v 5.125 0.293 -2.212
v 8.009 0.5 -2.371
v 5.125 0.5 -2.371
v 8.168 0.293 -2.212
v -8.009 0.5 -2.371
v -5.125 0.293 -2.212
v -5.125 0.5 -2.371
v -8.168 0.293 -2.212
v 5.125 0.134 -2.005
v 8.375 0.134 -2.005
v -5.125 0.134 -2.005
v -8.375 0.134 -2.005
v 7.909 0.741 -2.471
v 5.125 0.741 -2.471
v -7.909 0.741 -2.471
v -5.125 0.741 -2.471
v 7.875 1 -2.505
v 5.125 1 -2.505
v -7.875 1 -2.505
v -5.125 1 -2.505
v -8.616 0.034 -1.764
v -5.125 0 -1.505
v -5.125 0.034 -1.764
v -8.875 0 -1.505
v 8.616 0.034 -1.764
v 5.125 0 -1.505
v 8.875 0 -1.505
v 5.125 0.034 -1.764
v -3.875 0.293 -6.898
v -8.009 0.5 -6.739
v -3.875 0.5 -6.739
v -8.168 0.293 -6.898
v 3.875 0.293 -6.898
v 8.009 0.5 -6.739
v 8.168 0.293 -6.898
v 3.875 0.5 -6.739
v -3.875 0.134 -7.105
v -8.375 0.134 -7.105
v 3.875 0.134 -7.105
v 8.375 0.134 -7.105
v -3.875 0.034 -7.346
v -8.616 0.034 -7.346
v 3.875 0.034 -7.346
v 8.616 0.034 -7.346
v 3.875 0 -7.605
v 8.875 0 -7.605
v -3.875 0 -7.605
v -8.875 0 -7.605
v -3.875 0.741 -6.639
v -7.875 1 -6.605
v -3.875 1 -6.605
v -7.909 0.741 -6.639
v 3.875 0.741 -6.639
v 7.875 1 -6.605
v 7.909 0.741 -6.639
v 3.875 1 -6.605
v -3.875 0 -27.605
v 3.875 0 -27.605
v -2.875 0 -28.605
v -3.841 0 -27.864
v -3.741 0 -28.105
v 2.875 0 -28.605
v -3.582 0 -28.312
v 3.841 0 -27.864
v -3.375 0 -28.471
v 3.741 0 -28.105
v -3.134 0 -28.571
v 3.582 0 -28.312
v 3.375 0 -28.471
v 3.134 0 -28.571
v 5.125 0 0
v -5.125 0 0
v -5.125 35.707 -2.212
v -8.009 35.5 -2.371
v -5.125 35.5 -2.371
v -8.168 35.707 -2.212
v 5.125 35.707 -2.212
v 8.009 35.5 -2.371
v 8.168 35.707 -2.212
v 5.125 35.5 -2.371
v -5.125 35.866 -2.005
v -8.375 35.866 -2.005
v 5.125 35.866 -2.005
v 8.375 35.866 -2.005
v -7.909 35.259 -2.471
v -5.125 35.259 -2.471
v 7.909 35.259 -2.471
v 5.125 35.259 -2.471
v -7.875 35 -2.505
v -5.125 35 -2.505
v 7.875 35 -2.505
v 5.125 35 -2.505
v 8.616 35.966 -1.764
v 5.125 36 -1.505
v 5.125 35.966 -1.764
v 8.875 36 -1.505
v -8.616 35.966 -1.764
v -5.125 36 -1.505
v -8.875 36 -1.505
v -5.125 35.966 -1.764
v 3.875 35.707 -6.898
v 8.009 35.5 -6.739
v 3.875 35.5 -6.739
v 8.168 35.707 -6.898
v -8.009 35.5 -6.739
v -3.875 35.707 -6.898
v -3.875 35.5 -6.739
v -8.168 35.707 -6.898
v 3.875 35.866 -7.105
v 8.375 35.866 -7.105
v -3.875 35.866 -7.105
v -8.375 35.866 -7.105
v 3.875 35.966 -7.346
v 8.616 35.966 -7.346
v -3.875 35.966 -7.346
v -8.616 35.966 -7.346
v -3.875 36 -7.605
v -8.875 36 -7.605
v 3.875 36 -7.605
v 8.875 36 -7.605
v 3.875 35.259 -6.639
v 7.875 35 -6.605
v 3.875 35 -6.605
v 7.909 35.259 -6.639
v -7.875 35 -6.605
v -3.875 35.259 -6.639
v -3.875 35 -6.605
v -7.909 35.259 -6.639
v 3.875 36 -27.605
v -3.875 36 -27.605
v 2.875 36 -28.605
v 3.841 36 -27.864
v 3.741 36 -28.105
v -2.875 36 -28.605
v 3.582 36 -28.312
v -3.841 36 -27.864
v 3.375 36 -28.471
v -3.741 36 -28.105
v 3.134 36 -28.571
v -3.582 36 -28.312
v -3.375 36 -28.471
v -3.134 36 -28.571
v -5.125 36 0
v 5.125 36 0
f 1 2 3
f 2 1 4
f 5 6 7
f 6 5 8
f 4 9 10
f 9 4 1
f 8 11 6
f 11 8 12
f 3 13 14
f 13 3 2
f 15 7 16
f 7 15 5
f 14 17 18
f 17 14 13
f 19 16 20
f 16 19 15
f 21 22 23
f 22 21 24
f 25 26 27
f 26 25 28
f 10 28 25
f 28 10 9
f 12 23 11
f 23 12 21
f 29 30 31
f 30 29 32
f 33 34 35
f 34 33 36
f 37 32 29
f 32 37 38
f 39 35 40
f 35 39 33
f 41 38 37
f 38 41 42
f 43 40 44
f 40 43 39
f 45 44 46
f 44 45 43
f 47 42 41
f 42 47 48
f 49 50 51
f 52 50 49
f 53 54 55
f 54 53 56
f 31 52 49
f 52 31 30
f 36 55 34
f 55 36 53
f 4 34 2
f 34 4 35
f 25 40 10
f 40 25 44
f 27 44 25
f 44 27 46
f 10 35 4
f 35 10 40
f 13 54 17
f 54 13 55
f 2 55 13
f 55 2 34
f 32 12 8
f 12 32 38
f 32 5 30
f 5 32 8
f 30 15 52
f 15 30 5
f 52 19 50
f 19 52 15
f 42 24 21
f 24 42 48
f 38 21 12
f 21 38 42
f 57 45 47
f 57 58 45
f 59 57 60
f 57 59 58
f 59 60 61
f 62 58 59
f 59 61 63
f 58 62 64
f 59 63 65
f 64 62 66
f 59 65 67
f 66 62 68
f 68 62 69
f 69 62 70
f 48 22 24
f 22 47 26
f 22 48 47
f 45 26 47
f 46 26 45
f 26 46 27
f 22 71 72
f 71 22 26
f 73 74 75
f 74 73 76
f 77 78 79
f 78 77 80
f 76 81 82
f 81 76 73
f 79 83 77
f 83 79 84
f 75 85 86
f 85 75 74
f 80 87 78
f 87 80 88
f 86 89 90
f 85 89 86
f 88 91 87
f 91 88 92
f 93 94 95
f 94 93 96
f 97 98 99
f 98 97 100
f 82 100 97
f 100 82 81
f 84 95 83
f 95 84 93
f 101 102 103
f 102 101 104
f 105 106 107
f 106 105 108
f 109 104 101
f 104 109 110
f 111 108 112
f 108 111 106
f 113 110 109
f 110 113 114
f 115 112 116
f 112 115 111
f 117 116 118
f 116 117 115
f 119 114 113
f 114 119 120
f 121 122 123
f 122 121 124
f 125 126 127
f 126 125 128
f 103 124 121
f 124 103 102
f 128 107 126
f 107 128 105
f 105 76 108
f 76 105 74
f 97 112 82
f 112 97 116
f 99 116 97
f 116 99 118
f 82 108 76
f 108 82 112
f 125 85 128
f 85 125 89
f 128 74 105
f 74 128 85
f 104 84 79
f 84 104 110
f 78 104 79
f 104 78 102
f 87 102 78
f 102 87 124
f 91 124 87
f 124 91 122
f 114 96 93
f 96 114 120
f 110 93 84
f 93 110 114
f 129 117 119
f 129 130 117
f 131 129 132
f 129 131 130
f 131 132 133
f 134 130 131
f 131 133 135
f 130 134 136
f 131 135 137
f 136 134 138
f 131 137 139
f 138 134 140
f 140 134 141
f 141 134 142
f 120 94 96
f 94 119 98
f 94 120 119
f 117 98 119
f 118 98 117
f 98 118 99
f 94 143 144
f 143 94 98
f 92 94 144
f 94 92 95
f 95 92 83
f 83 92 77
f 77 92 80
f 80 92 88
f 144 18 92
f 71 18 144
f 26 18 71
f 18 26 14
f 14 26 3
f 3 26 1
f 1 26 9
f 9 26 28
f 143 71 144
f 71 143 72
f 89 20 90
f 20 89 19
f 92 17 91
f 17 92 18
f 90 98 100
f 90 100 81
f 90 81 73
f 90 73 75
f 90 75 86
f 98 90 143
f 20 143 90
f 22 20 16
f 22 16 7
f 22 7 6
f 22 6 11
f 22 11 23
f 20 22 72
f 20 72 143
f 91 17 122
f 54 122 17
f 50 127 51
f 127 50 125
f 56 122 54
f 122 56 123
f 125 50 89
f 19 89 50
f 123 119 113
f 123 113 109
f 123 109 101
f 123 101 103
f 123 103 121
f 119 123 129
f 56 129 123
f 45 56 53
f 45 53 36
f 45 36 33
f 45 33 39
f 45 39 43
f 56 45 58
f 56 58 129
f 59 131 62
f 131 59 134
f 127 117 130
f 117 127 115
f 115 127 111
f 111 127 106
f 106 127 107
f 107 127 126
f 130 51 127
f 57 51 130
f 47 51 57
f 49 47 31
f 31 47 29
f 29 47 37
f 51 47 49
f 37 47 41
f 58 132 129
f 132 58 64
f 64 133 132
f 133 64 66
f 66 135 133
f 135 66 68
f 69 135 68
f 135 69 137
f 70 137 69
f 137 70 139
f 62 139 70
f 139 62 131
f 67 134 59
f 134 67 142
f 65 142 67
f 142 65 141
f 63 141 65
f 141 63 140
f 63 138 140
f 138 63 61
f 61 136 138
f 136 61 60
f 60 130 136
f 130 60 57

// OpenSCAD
// This negative space can be combined with a Black+Decker to Ryobi adapter

internal_notch_offset = [0, 0, 0];
internal_notch_width = 10.25;
internal_notch_height = 2.505;
internal_notch_depth = 36; //34 after lower chamfer
internal_notch_translate = internal_notch_offset + [ -internal_notch_width/2, 0, -internal_notch_height];
internal_notch_chamfer = 1.000; //6 segments

slot_offset = [0, 0, -internal_notch_height];
slot_width = 15.75; //width before adding chamfer space
slot_height = 4.10;
slot_depth = 36;
slot_translate = slot_offset + [ -slot_width/2, 0, -slot_height];
//slot_width=17.875; //width at its widest point of the chamfer

external_notch_offset = slot_offset + [0, 0, -slot_height];
external_notch_width = 7.75;
external_notch_height = 22; //measured from bottom of slot
external_notch_depth = 36;
external_notch_translate = external_notch_offset + [ - external_notch_width/2, 0, -external_notch_height];

//90 degree chamfer arc of six segments
module arc() {
  intersection() {
    square();
    circle(r = 1, $fn=6*4);
  }
}

//negative chamfer arc
module narc() {
  difference() {
    square();
    circle(r = 1, $fn=6*4);
  }
}

//quarter_round module
module qr(d) {
  linear_extrude(d) arc();
}

//negative quarter round module
module nqr(d) {
  linear_extrude(d) narc();
}
module frame(width,height) {
  translate([width/2,0,height/2])rotate([0,90,180])qr(width);
  translate([-width/2,0,-height/2])rotate([0,-90,180])qr(width);
  translate([width/2,0,-height/2])rotate([0,0,180])qr(height);
  translate([-width/2,0,-height/2])rotate([0,0,-90])qr(height);
}
module nframe(width,height) {
    difference() {
        translate([-width/2,-1,-height/2])cube([width, 1, height]);
        frame(width, height);
    }
}

difference() {
  union() {
    translate(internal_notch_translate)
      cube([internal_notch_width,
            internal_notch_depth,
            internal_notch_height]);
        
    translate(slot_translate)
      cube([slot_width,
            slot_depth,
            slot_height]);

    translate(external_notch_translate)        
      cube([external_notch_width,
            external_notch_depth,
            external_notch_height]);
    //front chamfer frame
    translate(slot_offset+[0,1,-slot_height/2])
      nframe(slot_width+2,slot_height+2);
    //rear chamfer frame
      translate([0,slot_depth,0])
    rotate([0,0,180])
          translate(slot_offset+[0,1,-slot_height/2])
      nframe(slot_width+2,slot_height+2);
  }
  //lower right chamfer
  translate(external_notch_offset+[external_notch_width/2 -1,external_notch_depth,-(external_notch_height -1)])
    rotate([90,90,0])
      nqr(external_notch_depth);
  //lower left chamfer
  translate(external_notch_offset+[-(external_notch_width/2 -1),external_notch_depth,-(external_notch_height -1)])
    rotate([90,180,0])
      nqr(external_notch_depth);

}
